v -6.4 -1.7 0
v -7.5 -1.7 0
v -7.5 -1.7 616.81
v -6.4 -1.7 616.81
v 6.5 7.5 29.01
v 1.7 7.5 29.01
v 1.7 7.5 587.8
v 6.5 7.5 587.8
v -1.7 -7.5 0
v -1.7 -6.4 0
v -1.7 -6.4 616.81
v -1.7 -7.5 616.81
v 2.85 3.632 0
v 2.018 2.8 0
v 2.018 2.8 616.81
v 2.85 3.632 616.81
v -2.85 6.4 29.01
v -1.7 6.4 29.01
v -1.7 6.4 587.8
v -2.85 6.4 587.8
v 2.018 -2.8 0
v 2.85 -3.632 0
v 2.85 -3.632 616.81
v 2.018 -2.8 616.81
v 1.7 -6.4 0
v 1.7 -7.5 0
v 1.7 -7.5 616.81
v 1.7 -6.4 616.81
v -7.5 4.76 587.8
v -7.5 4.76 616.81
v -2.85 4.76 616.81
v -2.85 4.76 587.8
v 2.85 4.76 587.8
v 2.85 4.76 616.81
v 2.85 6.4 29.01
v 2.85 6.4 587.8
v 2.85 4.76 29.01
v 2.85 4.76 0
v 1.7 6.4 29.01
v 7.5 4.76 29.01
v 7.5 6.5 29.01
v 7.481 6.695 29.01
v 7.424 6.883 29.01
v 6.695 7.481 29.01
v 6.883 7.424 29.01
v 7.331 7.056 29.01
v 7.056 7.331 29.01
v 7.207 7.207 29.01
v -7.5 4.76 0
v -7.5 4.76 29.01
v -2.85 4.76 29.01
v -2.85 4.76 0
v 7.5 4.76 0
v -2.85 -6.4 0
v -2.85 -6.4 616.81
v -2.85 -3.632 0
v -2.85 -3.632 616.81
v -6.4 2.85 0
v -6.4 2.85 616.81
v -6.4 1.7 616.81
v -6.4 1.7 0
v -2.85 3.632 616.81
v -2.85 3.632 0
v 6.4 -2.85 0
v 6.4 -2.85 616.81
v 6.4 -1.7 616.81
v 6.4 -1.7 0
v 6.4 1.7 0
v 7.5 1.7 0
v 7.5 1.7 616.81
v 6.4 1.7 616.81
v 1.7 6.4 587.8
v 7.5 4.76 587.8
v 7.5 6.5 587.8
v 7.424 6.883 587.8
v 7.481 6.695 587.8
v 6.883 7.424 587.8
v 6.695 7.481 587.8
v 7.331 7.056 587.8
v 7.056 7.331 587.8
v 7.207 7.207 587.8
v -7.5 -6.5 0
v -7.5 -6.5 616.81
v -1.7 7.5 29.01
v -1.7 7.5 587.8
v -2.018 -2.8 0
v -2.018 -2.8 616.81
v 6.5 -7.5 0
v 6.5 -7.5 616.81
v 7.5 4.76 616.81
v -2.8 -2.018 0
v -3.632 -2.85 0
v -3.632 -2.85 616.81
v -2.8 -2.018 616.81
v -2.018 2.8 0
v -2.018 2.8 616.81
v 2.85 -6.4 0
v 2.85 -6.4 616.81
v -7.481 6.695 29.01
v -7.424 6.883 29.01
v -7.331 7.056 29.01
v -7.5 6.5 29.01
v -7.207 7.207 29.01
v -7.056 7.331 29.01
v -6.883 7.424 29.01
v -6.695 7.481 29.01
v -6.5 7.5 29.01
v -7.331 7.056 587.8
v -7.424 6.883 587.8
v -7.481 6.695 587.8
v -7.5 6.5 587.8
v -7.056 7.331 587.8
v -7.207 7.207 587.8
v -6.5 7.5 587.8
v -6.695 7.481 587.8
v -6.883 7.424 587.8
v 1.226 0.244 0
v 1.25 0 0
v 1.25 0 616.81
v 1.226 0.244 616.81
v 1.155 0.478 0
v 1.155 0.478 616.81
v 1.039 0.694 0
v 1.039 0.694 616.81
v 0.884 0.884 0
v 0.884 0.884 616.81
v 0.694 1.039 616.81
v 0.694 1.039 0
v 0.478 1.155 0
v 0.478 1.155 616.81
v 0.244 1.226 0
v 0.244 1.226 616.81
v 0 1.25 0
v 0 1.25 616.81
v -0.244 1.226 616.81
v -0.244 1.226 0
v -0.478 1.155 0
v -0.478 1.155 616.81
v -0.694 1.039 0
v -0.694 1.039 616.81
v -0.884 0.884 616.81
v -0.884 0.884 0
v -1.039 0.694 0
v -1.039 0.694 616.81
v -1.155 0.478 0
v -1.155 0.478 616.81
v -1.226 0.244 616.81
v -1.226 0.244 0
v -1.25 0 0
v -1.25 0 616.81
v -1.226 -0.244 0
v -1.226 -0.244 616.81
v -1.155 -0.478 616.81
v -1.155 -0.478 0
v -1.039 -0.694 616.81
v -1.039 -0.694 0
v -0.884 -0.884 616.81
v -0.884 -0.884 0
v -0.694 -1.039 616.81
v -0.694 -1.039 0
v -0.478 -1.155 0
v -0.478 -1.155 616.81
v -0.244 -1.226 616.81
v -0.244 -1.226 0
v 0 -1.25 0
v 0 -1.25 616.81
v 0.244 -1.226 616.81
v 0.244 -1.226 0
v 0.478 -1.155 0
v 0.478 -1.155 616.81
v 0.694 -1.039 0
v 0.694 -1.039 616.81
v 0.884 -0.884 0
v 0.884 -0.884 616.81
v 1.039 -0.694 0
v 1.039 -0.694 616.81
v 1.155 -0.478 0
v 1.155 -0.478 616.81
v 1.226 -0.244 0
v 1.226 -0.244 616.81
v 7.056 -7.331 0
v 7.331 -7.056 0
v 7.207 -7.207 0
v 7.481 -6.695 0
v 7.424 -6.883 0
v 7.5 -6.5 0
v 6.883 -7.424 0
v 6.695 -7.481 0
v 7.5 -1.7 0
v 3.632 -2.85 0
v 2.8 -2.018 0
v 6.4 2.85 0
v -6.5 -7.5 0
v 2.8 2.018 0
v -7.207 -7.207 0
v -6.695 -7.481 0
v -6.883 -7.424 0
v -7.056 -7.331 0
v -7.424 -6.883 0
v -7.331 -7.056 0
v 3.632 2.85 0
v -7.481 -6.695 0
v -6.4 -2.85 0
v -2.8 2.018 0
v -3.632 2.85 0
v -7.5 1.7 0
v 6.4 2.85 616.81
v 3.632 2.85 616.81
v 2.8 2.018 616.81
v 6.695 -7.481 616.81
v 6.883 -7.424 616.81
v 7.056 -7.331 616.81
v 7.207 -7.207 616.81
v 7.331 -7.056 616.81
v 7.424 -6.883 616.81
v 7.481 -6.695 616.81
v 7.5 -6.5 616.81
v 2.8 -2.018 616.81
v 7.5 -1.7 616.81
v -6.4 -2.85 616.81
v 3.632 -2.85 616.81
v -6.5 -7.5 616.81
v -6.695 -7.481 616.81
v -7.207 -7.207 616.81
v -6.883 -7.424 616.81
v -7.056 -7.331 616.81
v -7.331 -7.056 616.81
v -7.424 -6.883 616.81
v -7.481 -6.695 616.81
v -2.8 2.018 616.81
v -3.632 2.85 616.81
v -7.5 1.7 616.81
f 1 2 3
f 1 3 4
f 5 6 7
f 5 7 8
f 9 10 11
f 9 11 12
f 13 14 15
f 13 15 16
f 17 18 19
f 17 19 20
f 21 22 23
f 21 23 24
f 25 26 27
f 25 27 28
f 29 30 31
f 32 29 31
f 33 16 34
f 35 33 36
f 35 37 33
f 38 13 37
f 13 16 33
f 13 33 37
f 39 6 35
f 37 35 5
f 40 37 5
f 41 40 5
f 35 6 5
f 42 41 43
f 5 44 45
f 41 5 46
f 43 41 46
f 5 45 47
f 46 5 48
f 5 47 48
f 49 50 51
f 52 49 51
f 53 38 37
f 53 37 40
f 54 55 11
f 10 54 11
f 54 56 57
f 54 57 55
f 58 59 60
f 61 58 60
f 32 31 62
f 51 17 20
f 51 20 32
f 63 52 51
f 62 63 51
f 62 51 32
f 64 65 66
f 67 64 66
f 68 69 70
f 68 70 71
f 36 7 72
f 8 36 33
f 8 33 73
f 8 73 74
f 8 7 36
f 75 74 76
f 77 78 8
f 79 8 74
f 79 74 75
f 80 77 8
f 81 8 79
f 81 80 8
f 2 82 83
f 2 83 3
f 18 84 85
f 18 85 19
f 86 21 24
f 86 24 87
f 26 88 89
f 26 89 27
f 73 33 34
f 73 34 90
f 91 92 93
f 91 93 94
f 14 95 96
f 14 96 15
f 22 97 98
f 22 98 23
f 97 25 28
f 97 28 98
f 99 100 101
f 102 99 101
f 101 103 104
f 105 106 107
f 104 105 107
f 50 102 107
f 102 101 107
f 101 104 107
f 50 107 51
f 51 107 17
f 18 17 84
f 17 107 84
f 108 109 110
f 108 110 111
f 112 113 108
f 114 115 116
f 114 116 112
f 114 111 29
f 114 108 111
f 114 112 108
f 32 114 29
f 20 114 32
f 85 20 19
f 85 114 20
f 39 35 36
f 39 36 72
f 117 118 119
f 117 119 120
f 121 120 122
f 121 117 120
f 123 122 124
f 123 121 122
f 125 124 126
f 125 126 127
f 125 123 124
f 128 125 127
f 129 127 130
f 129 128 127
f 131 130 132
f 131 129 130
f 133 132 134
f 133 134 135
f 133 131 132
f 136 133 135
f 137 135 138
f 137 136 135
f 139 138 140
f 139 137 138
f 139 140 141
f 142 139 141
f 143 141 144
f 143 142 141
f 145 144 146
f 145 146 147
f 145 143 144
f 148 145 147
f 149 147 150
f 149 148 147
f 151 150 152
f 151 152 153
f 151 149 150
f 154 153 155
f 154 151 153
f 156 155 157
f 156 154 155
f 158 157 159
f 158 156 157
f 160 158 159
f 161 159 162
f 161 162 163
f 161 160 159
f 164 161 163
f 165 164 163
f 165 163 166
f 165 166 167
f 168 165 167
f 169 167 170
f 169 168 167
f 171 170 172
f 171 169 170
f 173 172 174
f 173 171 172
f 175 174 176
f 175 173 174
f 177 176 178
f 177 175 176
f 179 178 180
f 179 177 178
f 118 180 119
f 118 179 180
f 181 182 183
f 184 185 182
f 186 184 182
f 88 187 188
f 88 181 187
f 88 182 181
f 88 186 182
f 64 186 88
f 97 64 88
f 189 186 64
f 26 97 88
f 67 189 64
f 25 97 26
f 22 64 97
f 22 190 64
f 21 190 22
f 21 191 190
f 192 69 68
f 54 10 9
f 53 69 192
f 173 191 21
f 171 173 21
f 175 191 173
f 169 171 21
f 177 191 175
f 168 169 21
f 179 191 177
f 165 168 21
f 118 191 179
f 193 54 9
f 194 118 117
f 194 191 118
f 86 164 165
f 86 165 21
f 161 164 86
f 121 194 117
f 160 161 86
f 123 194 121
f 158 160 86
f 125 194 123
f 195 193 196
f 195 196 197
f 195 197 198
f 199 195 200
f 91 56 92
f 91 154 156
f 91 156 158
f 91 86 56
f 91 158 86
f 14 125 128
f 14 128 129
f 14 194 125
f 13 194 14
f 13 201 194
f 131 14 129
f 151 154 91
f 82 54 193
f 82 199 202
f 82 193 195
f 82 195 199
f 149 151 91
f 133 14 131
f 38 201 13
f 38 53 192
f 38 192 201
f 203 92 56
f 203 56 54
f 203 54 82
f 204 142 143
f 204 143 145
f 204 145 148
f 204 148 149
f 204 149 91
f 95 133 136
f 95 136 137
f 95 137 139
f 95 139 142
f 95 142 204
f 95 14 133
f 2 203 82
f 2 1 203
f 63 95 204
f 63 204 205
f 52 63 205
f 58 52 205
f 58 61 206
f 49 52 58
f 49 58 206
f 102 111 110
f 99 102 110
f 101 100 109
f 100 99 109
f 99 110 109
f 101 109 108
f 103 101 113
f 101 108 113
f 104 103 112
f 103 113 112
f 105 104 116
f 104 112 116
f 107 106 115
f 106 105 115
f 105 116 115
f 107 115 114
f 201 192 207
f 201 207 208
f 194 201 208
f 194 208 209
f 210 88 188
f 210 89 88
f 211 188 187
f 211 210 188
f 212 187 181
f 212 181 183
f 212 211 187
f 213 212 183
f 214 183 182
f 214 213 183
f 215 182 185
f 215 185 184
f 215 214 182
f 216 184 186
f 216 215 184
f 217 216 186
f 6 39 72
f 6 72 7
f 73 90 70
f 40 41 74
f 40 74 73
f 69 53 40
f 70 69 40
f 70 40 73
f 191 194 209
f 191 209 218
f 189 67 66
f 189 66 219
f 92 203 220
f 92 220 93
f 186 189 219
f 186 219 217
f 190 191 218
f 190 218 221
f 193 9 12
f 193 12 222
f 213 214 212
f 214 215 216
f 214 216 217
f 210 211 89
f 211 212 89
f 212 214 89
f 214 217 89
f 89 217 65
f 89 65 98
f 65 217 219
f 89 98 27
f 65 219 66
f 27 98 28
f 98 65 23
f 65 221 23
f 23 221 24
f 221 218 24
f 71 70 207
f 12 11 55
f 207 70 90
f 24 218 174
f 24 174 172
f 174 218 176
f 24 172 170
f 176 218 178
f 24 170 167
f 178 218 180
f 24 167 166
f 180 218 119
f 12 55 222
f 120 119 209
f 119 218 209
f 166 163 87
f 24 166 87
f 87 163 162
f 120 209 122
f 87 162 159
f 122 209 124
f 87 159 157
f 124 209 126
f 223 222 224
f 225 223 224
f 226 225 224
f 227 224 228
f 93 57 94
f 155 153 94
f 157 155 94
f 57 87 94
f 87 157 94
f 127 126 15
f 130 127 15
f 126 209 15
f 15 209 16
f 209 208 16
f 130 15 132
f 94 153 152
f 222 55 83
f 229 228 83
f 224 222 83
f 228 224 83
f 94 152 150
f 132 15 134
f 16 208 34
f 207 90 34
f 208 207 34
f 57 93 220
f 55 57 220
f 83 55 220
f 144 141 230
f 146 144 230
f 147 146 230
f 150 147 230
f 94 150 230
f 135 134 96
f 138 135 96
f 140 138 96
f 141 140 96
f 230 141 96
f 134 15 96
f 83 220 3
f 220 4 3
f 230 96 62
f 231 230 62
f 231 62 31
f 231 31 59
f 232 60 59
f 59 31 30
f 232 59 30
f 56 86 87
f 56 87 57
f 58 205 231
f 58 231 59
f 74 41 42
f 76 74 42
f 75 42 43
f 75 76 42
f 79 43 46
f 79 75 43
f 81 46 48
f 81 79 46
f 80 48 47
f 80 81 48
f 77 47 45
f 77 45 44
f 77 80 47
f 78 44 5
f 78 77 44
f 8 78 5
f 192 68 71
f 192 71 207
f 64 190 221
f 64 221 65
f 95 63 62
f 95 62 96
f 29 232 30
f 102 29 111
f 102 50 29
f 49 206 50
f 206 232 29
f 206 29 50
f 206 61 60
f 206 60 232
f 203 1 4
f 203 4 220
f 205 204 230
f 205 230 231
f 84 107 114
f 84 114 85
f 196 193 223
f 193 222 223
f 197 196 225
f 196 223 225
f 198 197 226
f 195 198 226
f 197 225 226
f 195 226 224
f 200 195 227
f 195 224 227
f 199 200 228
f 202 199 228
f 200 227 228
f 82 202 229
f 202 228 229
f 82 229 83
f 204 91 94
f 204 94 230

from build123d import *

# Parameters (mm, degrees)
SKETCH1_R           = 1.25
BOSS_EXTRUDE1_DEPTH = 616.81
FILLET1_R           = 1
SKETCH2_W           = 15
SKETCH2_H           = 29.01
CUT_EXTRUDE2_DEPTH  = 2.74
SKETCH3_W           = 15
SKETCH3_H           = 29.01
CUT_EXTRUDE3_DEPTH  = 2.74


with BuildPart() as part:
    # Sketch1 → Boss-Extrude1 (new body)
    with BuildSketch(Plane.XY):
        Polygon((7.5, -7.5), (1.7, -7.5), (1.7, -6.4), (2.85, -6.4), (2.85, -3.63183498), (2.01816502, -2.8), (-2.01816502, -2.8), (-2.85, -3.63183498), (-2.85, -6.4), (-1.7, -6.4), (-1.7, -7.5), (-7.5, -7.5), (-7.5, -1.7), (-6.4, -1.7), (-6.4, -2.85), (-3.63183498, -2.85), (-2.8, -2.01816502), (-2.8, 2.01816502), (-3.63183498, 2.85), (-6.4, 2.85), (-6.4, 1.7), (-7.5, 1.7), (-7.5, 7.5), (-1.7, 7.5), (-1.7, 6.4), (-2.85, 6.4), (-2.85, 3.63183498), (-2.01816502, 2.8), (2.01816502, 2.8), (2.85, 3.63183498), (2.85, 6.4), (1.7, 6.4), (1.7, 7.5), (7.5, 7.5), (7.5, 1.7), (6.4, 1.7), (6.4, 2.85), (3.63183498, 2.85), (2.8, 2.01816502), (2.8, -2.01816502), (3.63183498, -2.85), (6.4, -2.85), (6.4, -1.7), (7.5, -1.7), align=None)
        Circle(SKETCH1_R, mode=Mode.SUBTRACT)
    extrude(amount=BOSS_EXTRUDE1_DEPTH)

    # Fillet1
    fillet1_edges = [part.edges().sort_by_distance(p)[0] for p in [
        (-7.5, 7.5, 308.405),
        (7.5, 7.5, 308.405),
        (7.5, -7.5, 308.405),
        (-7.5, -7.5, 308.405),
    ]]
    fillet(fillet1_edges, radius=FILLET1_R)

    # Sketch2 → Cut-Extrude2 (cut)
    with BuildSketch(Plane(origin=(0, 7.5, 0), x_dir=(1, 0, 0), z_dir=(0, 1, 0))):
        with Locations((0, -602.305)):
            Rectangle(SKETCH2_W, SKETCH2_H)
    extrude(amount=-CUT_EXTRUDE2_DEPTH, mode=Mode.SUBTRACT)

    # Sketch3 → Cut-Extrude3 (cut)
    with BuildSketch(Plane(origin=(0, 7.5, 0), x_dir=(1, 0, 0), z_dir=(0, 1, 0))):
        with Locations((0, -14.505)):
            Rectangle(SKETCH3_W, SKETCH3_H)
    extrude(amount=-CUT_EXTRUDE3_DEPTH, mode=Mode.SUBTRACT)


solid = part.part
